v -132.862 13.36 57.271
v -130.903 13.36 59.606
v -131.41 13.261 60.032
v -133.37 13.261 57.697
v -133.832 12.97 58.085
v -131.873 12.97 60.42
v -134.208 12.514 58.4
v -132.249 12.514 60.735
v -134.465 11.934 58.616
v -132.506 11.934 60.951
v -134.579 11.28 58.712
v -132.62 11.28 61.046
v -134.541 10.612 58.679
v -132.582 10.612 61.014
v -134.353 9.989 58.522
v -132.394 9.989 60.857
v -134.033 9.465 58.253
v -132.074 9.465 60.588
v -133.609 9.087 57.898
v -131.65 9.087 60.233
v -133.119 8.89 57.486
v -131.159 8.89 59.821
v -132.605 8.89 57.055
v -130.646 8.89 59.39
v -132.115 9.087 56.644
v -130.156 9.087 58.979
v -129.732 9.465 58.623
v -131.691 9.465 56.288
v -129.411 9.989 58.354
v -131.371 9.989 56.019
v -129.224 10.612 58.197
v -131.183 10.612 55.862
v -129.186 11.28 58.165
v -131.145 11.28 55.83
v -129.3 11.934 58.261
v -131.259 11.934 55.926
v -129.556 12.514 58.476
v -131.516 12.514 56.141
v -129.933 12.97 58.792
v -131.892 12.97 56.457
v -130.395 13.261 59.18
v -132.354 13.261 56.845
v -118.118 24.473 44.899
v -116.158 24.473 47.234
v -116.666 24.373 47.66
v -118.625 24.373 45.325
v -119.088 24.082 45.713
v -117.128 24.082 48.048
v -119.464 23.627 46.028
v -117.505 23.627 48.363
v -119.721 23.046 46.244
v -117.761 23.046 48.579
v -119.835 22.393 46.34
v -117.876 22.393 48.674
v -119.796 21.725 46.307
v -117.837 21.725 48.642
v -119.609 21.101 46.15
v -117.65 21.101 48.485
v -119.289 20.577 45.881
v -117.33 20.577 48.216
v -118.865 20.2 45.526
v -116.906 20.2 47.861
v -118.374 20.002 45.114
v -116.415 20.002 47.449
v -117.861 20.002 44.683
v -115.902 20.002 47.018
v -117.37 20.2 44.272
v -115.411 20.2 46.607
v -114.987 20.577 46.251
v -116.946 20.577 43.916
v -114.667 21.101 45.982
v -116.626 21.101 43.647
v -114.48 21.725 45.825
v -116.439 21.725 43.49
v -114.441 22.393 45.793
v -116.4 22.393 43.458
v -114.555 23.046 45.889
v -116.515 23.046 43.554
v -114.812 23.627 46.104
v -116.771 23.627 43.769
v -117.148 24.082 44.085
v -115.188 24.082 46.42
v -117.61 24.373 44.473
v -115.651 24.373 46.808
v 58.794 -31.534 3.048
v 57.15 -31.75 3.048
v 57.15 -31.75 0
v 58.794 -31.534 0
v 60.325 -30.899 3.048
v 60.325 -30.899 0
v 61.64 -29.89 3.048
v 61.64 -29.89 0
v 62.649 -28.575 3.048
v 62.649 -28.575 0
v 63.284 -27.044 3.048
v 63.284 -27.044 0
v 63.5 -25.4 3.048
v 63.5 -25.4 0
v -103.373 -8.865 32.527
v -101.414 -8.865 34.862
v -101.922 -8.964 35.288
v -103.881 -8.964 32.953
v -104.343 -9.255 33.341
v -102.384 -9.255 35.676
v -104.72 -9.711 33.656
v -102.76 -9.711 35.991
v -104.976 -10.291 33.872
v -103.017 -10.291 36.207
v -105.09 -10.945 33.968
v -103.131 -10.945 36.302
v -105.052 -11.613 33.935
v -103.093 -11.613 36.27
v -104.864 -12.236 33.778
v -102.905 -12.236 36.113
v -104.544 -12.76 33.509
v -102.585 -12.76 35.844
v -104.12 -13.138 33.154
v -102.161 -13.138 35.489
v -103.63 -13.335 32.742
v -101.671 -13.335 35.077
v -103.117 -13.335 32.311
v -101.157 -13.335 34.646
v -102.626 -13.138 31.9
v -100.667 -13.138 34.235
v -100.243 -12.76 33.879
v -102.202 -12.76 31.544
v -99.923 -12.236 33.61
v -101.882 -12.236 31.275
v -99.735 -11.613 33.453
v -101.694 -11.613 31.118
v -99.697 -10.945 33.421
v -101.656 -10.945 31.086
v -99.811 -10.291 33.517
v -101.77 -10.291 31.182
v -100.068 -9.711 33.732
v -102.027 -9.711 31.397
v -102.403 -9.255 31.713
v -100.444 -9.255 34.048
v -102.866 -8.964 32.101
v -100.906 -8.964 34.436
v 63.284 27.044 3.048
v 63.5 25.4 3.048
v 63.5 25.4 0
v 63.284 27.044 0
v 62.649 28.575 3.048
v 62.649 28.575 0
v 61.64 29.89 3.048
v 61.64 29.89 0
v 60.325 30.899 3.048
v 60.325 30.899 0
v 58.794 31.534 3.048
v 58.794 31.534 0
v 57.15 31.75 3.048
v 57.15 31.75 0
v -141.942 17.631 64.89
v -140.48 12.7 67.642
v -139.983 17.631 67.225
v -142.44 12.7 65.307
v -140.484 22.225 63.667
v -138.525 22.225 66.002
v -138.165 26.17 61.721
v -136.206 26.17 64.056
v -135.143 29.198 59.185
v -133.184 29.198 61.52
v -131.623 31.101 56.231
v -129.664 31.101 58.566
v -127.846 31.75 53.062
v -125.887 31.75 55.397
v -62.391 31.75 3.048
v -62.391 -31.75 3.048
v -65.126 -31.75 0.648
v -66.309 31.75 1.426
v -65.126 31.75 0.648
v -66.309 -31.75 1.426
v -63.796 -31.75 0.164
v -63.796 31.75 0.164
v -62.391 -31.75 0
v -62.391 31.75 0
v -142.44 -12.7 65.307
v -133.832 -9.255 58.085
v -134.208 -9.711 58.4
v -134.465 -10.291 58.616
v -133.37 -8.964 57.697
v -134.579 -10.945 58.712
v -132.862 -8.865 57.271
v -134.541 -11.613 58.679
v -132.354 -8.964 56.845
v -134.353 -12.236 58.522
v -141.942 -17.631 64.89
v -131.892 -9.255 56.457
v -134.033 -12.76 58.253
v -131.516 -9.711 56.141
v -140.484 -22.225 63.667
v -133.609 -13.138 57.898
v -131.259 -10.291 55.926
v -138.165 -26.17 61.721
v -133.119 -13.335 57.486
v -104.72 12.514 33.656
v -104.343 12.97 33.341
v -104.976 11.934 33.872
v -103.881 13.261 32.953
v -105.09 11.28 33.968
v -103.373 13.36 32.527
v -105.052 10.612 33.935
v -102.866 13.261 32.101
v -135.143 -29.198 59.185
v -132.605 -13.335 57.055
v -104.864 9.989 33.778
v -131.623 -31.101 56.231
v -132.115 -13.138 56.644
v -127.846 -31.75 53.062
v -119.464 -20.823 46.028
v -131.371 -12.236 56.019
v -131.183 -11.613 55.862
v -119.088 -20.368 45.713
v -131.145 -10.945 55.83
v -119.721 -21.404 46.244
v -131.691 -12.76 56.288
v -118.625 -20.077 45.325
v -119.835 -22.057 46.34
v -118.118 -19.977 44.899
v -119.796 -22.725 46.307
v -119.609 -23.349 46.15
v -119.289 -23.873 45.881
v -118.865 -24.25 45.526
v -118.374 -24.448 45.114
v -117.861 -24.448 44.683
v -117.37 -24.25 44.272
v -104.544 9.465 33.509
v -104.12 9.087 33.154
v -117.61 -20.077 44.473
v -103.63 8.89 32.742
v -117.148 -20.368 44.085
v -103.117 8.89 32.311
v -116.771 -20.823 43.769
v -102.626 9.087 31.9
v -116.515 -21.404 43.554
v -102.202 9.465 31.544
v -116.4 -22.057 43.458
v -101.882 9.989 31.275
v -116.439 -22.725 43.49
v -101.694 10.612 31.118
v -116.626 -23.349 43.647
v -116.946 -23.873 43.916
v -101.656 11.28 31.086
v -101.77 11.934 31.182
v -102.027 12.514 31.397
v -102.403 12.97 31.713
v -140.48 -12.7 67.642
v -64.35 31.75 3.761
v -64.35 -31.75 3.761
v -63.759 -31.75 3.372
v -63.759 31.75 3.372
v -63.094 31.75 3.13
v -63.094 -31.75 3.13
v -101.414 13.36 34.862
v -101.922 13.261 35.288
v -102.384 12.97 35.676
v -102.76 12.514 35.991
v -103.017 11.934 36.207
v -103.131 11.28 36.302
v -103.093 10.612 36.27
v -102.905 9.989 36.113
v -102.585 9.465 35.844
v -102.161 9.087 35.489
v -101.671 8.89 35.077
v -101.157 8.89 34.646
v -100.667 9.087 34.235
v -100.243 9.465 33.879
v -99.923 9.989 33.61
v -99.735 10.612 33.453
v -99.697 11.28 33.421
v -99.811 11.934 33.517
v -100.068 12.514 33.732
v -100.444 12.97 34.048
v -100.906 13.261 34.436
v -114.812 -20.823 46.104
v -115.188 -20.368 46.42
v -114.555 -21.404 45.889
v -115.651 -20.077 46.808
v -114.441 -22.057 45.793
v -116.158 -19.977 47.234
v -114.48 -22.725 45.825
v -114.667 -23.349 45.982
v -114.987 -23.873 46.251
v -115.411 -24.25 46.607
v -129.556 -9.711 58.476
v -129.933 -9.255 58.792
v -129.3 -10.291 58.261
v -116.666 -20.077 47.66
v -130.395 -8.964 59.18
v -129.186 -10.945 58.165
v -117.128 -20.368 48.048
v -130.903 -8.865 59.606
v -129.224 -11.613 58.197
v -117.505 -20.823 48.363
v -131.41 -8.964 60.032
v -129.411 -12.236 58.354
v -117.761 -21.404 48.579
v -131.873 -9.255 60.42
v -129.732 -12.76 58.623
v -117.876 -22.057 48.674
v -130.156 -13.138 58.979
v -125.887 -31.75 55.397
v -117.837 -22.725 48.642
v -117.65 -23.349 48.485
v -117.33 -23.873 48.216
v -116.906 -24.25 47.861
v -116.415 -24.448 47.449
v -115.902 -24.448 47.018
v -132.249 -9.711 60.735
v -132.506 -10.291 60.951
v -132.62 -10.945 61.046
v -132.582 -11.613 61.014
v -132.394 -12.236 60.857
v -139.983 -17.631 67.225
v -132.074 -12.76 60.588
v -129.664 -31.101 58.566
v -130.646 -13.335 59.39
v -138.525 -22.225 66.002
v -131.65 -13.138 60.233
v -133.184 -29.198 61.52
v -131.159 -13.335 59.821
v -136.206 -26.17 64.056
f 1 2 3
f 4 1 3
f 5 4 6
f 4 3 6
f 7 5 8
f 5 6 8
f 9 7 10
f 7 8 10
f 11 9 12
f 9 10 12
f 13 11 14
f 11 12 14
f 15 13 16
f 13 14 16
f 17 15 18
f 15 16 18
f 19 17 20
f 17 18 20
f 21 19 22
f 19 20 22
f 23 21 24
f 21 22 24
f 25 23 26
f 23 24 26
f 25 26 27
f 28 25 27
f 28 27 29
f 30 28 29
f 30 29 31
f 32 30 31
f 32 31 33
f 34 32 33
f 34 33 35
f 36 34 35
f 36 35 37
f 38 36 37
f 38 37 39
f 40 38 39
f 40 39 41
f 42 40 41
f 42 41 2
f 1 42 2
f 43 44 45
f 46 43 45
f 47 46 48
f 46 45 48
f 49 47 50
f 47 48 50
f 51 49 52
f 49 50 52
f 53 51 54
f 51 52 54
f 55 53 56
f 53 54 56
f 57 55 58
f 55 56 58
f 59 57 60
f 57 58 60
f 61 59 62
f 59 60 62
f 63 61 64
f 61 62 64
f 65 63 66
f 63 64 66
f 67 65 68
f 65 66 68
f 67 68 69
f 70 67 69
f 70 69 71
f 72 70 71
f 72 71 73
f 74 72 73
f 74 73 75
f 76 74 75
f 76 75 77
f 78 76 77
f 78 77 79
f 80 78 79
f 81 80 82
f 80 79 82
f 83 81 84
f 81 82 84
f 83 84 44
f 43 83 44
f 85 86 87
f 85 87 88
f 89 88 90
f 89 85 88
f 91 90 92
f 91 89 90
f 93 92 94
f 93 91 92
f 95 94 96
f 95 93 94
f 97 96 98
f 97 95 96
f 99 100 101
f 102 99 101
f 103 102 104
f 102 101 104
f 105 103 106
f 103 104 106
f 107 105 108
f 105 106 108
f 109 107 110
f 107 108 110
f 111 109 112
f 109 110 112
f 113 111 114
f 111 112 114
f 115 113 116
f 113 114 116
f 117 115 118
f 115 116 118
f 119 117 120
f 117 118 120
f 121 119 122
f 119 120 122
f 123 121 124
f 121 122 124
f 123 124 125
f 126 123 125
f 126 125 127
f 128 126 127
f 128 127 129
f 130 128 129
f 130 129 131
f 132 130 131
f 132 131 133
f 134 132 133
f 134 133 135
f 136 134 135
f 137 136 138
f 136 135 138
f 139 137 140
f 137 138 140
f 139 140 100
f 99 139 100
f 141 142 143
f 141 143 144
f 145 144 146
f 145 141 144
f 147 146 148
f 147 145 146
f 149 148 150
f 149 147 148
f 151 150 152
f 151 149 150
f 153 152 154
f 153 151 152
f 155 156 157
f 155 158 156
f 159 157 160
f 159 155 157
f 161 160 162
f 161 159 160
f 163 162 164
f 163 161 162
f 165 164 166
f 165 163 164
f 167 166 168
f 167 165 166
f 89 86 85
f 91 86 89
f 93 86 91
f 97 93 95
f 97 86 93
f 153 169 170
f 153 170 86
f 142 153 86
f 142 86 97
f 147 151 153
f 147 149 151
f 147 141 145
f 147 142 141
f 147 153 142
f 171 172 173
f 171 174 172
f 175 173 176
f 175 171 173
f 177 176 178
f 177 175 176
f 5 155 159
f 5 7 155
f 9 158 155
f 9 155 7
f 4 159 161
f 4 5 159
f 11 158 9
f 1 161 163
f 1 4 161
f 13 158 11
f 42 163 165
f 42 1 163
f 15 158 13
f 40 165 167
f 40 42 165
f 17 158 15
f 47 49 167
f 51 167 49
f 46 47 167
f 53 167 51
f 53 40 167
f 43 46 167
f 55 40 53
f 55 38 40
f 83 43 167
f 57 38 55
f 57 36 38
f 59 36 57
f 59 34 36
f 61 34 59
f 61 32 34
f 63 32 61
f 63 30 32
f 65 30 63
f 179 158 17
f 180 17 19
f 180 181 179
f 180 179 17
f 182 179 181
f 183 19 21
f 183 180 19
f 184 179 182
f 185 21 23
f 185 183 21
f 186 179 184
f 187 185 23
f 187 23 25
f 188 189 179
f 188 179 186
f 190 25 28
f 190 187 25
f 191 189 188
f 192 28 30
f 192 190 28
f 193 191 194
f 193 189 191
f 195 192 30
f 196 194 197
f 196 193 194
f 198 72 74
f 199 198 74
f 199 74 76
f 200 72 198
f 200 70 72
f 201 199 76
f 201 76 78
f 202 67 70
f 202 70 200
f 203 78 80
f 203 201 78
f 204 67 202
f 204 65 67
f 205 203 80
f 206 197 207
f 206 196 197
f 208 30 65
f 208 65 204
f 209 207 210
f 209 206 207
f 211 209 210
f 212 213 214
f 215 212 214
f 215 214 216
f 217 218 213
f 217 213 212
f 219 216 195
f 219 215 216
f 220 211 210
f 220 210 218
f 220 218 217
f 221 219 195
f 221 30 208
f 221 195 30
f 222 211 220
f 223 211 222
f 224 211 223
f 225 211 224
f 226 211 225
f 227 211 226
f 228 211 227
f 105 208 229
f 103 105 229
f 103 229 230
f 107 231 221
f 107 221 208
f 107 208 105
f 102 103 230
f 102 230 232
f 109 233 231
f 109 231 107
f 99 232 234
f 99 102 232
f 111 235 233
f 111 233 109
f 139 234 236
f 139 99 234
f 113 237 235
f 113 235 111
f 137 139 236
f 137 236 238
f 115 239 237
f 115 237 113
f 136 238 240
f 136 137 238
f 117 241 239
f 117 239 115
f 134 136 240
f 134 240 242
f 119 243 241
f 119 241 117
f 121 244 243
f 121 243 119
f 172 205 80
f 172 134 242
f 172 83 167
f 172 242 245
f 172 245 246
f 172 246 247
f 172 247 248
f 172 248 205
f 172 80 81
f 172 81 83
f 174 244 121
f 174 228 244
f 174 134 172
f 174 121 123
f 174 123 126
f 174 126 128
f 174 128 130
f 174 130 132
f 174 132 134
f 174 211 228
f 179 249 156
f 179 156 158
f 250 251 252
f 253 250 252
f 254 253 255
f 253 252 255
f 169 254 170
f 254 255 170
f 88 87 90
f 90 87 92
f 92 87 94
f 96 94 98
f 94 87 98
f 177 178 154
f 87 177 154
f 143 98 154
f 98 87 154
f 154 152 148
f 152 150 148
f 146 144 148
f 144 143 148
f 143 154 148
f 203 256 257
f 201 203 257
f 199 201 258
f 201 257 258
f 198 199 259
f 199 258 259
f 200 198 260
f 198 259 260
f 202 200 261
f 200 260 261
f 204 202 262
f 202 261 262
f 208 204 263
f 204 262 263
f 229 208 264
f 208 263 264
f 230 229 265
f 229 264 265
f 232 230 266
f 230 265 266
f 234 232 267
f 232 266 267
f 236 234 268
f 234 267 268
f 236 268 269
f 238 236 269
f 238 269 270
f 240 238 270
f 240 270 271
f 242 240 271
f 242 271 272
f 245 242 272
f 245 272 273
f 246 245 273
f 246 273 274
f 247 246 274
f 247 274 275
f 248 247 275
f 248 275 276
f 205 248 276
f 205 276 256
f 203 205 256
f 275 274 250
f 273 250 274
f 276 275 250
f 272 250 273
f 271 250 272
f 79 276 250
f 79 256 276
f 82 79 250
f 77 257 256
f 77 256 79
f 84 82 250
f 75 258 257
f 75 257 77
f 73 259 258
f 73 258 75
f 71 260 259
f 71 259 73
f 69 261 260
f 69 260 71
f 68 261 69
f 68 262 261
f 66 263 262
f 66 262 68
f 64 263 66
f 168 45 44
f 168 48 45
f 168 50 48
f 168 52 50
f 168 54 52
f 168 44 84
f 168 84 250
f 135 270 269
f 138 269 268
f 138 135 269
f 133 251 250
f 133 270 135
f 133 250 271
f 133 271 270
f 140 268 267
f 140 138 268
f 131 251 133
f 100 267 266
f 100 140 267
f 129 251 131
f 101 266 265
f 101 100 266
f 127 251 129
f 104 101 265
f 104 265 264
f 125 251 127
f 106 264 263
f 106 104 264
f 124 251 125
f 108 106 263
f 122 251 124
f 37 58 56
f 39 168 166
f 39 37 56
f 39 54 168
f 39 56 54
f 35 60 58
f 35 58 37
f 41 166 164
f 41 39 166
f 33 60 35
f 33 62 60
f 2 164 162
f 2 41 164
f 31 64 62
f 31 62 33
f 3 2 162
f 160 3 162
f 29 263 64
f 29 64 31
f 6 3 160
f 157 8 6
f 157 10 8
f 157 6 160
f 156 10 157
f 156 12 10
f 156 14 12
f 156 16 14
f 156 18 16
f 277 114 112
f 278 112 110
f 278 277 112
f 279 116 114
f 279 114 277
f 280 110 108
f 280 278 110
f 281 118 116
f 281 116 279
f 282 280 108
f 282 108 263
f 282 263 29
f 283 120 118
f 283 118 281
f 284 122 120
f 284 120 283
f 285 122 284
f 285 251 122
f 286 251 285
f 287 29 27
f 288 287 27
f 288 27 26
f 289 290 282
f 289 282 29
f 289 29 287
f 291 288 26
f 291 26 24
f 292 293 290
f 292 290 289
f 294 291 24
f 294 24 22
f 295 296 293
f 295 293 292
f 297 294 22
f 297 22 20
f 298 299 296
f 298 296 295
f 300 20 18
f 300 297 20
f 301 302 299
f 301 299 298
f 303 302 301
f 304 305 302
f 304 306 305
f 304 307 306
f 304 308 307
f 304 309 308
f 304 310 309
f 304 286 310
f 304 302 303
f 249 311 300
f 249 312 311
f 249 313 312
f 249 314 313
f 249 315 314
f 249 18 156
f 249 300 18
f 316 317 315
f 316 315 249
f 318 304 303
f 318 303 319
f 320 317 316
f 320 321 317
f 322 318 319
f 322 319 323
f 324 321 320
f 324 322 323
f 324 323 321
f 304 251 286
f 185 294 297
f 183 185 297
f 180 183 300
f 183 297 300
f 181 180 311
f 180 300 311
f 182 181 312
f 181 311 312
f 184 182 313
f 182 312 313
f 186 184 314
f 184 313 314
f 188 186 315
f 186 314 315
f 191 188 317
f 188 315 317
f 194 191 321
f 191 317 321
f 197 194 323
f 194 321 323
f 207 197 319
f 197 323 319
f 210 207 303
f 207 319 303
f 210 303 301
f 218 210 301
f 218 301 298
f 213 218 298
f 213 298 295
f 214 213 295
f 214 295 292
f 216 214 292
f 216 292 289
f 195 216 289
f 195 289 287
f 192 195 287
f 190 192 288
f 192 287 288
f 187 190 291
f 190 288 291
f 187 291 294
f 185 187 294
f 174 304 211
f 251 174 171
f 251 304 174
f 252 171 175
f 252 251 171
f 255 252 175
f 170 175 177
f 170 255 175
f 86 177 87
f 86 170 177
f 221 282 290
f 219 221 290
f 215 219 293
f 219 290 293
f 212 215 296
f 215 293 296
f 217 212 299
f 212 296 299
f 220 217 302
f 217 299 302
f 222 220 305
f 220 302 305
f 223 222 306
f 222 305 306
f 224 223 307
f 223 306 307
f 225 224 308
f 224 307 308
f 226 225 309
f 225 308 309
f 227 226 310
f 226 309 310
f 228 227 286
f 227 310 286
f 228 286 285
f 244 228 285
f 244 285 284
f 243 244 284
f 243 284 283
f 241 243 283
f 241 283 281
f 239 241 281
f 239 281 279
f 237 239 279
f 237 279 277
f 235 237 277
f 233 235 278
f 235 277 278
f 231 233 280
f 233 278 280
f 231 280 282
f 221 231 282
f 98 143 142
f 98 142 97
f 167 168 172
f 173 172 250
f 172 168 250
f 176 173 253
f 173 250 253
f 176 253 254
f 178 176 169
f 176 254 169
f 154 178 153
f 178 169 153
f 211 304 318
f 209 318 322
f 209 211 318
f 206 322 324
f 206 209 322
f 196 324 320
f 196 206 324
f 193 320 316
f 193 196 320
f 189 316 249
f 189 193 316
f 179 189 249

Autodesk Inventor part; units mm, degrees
ref_plane "YZ Plane" through (0, 0, 0) normal (1, 0, 0) x (0, 1, 0)
ref_plane "XZ Plane" through (0, 0, 0) normal (0, 1, 0) x (-1, 0, 0)
ref_plane "XY Plane" through (0, 0, 0) normal (0, 0, 1) x (1, 0, 0)
sketch "Sketch1" plane through (0, 0, 0) normal (0, 0, 1) x (1, 0, 0)
  line L0 (63.5, -31.75) -> (-63.5, -31.75)
  line L1 (-63.5, -31.75) -> (-63.5, 31.75)
  line L2 (-63.5, 31.75) -> (63.5, 31.75)
  line L3 (63.5, 31.75) -> (63.5, -31.75)
  line L4 (63.5, -31.75) -> (-63.5, 31.75) construction
  line L5 (-63.5, -31.75) -> (63.5, 31.75) construction
  point P0 (0, 0)
  dimension "d0" = 63.5
  dimension "d1" = 127
extrude "Plate1" add sketch "Sketch1" along normal blind 3.048
sketch "Sketch2" plane through (-63.5, -31.75, 3.048) normal (-0.6427876, 0, -0.7660444) x (0, -1, 0)
  line L0 (-63.5, 0) -> (0, 0)
  line L1 (0, 0) -> (0, 100.4906)
  line L2 (0, 100.4906) -> (-63.5, 100.4906)
  line L3 (-63.5, 100.4906) -> (-63.5, 0)
edge flange "Flange1" height 101.6 angle 40 thickness 3.048 bend radius 3.048 thickness toward (-0.6427876, 0, -0.7660444) relief tear relief width 3.048 relief depth 1.524 edges at (-63.5, 0, 3.048) wall of the first edge with corners at (-63.5, 31.75, 3.048) (-63.5, -31.75, 3.048) (-140.4803, -31.75, 67.6421) (-140.4803, 31.75, 67.6421)
bend "Bend1"
corner "Corner1"
sketch "Sketch3" plane through (-142.4395, -31.75, 65.3072) normal (-0.6427876, 0, -0.7660444) x (-0.7660444, 0, 0.6427876)
  circle A0 centre (-31.75, 31.75) radius 22.225 construction
  line L0 (-99.3812, 63.5) -> (0, 63.5) construction
  line L1 (0, 63.5) -> (0, 0) construction
  point P0 (-151.0937, 31.75)
  point P1 (-49.6906, 63.5)
  point P2 (-31.75, 53.975)
  point P3 (-50.9974, 42.8625)
  point P4 (-50.9974, 20.6375)
  point P5 (-31.75, 9.525)
  point P6 (-12.5026, 20.6375)
  point P7 (-12.5026, 42.8625)
  dimension "d13" = 44.45
  dimension "d16" = 360
  dimension "d25" = 31.75
hole "Hole1" at (-118.1176, 22.225, 44.8987) at (-103.3732, 11.1125, 32.5267) at (-103.3732, -11.1125, 32.5267) at (-118.1176, -22.225, 44.8987) at (-132.862, -11.1125, 57.2707) at (-132.862, 11.1125, 57.2707) direction (0.6427876, 0, 0.7660444) diameter 4.4958 depth 3.048 tip angle 118 clearance for "Flat Head Machine Screw (82)" size "#8" standard "Ansi Unified Screw Threads"
fillet "Fillet1" radius 19.05 2 edges at (-141.4599, -31.75, 66.4747) (-141.4599, 31.75, 66.4747)
fillet "Fillet2" radius 6.35 2 edges at (63.5, 31.75, 1.524) (63.5, -31.75, 1.524)
equation "\"d23\" = Thickness"
equation "\"d2\" = Thickness"
equation "\"d3\" = BendReliefWidth"
equation "\"d4\" = BendReliefDepth"
equation "\"d5\" = MinimumRemnant"
equation "\"d6\" = TransitionRadius"
equation "\"d9\" = BendRadius"
equation "\"d10\" = CornerReliefSize"
equation "\"d11\" = GapSize"
equation "\"d12\" = JacobiRadiusSize"
equation "\"BendRadius\" = Thickness"
equation "\"BendReliefWidth\" = Thickness"
equation "\"BendReliefDepth\" = 0.5 * Thickness"
equation "\"CornerReliefSize\" = 4 * Thickness"
equation "\"MinimumRemnant\" = 2 * Thickness"
equation "\"TransitionRadius\" = BendRadius"
equation "\"JacobiRadiusSize\" = BendRadius"
equation "\"GapSize\" = Thickness"
equation "\"Thickness\" = 3.048"
properties part number "CL7-023" material "Polycarbonate, Smoke"
